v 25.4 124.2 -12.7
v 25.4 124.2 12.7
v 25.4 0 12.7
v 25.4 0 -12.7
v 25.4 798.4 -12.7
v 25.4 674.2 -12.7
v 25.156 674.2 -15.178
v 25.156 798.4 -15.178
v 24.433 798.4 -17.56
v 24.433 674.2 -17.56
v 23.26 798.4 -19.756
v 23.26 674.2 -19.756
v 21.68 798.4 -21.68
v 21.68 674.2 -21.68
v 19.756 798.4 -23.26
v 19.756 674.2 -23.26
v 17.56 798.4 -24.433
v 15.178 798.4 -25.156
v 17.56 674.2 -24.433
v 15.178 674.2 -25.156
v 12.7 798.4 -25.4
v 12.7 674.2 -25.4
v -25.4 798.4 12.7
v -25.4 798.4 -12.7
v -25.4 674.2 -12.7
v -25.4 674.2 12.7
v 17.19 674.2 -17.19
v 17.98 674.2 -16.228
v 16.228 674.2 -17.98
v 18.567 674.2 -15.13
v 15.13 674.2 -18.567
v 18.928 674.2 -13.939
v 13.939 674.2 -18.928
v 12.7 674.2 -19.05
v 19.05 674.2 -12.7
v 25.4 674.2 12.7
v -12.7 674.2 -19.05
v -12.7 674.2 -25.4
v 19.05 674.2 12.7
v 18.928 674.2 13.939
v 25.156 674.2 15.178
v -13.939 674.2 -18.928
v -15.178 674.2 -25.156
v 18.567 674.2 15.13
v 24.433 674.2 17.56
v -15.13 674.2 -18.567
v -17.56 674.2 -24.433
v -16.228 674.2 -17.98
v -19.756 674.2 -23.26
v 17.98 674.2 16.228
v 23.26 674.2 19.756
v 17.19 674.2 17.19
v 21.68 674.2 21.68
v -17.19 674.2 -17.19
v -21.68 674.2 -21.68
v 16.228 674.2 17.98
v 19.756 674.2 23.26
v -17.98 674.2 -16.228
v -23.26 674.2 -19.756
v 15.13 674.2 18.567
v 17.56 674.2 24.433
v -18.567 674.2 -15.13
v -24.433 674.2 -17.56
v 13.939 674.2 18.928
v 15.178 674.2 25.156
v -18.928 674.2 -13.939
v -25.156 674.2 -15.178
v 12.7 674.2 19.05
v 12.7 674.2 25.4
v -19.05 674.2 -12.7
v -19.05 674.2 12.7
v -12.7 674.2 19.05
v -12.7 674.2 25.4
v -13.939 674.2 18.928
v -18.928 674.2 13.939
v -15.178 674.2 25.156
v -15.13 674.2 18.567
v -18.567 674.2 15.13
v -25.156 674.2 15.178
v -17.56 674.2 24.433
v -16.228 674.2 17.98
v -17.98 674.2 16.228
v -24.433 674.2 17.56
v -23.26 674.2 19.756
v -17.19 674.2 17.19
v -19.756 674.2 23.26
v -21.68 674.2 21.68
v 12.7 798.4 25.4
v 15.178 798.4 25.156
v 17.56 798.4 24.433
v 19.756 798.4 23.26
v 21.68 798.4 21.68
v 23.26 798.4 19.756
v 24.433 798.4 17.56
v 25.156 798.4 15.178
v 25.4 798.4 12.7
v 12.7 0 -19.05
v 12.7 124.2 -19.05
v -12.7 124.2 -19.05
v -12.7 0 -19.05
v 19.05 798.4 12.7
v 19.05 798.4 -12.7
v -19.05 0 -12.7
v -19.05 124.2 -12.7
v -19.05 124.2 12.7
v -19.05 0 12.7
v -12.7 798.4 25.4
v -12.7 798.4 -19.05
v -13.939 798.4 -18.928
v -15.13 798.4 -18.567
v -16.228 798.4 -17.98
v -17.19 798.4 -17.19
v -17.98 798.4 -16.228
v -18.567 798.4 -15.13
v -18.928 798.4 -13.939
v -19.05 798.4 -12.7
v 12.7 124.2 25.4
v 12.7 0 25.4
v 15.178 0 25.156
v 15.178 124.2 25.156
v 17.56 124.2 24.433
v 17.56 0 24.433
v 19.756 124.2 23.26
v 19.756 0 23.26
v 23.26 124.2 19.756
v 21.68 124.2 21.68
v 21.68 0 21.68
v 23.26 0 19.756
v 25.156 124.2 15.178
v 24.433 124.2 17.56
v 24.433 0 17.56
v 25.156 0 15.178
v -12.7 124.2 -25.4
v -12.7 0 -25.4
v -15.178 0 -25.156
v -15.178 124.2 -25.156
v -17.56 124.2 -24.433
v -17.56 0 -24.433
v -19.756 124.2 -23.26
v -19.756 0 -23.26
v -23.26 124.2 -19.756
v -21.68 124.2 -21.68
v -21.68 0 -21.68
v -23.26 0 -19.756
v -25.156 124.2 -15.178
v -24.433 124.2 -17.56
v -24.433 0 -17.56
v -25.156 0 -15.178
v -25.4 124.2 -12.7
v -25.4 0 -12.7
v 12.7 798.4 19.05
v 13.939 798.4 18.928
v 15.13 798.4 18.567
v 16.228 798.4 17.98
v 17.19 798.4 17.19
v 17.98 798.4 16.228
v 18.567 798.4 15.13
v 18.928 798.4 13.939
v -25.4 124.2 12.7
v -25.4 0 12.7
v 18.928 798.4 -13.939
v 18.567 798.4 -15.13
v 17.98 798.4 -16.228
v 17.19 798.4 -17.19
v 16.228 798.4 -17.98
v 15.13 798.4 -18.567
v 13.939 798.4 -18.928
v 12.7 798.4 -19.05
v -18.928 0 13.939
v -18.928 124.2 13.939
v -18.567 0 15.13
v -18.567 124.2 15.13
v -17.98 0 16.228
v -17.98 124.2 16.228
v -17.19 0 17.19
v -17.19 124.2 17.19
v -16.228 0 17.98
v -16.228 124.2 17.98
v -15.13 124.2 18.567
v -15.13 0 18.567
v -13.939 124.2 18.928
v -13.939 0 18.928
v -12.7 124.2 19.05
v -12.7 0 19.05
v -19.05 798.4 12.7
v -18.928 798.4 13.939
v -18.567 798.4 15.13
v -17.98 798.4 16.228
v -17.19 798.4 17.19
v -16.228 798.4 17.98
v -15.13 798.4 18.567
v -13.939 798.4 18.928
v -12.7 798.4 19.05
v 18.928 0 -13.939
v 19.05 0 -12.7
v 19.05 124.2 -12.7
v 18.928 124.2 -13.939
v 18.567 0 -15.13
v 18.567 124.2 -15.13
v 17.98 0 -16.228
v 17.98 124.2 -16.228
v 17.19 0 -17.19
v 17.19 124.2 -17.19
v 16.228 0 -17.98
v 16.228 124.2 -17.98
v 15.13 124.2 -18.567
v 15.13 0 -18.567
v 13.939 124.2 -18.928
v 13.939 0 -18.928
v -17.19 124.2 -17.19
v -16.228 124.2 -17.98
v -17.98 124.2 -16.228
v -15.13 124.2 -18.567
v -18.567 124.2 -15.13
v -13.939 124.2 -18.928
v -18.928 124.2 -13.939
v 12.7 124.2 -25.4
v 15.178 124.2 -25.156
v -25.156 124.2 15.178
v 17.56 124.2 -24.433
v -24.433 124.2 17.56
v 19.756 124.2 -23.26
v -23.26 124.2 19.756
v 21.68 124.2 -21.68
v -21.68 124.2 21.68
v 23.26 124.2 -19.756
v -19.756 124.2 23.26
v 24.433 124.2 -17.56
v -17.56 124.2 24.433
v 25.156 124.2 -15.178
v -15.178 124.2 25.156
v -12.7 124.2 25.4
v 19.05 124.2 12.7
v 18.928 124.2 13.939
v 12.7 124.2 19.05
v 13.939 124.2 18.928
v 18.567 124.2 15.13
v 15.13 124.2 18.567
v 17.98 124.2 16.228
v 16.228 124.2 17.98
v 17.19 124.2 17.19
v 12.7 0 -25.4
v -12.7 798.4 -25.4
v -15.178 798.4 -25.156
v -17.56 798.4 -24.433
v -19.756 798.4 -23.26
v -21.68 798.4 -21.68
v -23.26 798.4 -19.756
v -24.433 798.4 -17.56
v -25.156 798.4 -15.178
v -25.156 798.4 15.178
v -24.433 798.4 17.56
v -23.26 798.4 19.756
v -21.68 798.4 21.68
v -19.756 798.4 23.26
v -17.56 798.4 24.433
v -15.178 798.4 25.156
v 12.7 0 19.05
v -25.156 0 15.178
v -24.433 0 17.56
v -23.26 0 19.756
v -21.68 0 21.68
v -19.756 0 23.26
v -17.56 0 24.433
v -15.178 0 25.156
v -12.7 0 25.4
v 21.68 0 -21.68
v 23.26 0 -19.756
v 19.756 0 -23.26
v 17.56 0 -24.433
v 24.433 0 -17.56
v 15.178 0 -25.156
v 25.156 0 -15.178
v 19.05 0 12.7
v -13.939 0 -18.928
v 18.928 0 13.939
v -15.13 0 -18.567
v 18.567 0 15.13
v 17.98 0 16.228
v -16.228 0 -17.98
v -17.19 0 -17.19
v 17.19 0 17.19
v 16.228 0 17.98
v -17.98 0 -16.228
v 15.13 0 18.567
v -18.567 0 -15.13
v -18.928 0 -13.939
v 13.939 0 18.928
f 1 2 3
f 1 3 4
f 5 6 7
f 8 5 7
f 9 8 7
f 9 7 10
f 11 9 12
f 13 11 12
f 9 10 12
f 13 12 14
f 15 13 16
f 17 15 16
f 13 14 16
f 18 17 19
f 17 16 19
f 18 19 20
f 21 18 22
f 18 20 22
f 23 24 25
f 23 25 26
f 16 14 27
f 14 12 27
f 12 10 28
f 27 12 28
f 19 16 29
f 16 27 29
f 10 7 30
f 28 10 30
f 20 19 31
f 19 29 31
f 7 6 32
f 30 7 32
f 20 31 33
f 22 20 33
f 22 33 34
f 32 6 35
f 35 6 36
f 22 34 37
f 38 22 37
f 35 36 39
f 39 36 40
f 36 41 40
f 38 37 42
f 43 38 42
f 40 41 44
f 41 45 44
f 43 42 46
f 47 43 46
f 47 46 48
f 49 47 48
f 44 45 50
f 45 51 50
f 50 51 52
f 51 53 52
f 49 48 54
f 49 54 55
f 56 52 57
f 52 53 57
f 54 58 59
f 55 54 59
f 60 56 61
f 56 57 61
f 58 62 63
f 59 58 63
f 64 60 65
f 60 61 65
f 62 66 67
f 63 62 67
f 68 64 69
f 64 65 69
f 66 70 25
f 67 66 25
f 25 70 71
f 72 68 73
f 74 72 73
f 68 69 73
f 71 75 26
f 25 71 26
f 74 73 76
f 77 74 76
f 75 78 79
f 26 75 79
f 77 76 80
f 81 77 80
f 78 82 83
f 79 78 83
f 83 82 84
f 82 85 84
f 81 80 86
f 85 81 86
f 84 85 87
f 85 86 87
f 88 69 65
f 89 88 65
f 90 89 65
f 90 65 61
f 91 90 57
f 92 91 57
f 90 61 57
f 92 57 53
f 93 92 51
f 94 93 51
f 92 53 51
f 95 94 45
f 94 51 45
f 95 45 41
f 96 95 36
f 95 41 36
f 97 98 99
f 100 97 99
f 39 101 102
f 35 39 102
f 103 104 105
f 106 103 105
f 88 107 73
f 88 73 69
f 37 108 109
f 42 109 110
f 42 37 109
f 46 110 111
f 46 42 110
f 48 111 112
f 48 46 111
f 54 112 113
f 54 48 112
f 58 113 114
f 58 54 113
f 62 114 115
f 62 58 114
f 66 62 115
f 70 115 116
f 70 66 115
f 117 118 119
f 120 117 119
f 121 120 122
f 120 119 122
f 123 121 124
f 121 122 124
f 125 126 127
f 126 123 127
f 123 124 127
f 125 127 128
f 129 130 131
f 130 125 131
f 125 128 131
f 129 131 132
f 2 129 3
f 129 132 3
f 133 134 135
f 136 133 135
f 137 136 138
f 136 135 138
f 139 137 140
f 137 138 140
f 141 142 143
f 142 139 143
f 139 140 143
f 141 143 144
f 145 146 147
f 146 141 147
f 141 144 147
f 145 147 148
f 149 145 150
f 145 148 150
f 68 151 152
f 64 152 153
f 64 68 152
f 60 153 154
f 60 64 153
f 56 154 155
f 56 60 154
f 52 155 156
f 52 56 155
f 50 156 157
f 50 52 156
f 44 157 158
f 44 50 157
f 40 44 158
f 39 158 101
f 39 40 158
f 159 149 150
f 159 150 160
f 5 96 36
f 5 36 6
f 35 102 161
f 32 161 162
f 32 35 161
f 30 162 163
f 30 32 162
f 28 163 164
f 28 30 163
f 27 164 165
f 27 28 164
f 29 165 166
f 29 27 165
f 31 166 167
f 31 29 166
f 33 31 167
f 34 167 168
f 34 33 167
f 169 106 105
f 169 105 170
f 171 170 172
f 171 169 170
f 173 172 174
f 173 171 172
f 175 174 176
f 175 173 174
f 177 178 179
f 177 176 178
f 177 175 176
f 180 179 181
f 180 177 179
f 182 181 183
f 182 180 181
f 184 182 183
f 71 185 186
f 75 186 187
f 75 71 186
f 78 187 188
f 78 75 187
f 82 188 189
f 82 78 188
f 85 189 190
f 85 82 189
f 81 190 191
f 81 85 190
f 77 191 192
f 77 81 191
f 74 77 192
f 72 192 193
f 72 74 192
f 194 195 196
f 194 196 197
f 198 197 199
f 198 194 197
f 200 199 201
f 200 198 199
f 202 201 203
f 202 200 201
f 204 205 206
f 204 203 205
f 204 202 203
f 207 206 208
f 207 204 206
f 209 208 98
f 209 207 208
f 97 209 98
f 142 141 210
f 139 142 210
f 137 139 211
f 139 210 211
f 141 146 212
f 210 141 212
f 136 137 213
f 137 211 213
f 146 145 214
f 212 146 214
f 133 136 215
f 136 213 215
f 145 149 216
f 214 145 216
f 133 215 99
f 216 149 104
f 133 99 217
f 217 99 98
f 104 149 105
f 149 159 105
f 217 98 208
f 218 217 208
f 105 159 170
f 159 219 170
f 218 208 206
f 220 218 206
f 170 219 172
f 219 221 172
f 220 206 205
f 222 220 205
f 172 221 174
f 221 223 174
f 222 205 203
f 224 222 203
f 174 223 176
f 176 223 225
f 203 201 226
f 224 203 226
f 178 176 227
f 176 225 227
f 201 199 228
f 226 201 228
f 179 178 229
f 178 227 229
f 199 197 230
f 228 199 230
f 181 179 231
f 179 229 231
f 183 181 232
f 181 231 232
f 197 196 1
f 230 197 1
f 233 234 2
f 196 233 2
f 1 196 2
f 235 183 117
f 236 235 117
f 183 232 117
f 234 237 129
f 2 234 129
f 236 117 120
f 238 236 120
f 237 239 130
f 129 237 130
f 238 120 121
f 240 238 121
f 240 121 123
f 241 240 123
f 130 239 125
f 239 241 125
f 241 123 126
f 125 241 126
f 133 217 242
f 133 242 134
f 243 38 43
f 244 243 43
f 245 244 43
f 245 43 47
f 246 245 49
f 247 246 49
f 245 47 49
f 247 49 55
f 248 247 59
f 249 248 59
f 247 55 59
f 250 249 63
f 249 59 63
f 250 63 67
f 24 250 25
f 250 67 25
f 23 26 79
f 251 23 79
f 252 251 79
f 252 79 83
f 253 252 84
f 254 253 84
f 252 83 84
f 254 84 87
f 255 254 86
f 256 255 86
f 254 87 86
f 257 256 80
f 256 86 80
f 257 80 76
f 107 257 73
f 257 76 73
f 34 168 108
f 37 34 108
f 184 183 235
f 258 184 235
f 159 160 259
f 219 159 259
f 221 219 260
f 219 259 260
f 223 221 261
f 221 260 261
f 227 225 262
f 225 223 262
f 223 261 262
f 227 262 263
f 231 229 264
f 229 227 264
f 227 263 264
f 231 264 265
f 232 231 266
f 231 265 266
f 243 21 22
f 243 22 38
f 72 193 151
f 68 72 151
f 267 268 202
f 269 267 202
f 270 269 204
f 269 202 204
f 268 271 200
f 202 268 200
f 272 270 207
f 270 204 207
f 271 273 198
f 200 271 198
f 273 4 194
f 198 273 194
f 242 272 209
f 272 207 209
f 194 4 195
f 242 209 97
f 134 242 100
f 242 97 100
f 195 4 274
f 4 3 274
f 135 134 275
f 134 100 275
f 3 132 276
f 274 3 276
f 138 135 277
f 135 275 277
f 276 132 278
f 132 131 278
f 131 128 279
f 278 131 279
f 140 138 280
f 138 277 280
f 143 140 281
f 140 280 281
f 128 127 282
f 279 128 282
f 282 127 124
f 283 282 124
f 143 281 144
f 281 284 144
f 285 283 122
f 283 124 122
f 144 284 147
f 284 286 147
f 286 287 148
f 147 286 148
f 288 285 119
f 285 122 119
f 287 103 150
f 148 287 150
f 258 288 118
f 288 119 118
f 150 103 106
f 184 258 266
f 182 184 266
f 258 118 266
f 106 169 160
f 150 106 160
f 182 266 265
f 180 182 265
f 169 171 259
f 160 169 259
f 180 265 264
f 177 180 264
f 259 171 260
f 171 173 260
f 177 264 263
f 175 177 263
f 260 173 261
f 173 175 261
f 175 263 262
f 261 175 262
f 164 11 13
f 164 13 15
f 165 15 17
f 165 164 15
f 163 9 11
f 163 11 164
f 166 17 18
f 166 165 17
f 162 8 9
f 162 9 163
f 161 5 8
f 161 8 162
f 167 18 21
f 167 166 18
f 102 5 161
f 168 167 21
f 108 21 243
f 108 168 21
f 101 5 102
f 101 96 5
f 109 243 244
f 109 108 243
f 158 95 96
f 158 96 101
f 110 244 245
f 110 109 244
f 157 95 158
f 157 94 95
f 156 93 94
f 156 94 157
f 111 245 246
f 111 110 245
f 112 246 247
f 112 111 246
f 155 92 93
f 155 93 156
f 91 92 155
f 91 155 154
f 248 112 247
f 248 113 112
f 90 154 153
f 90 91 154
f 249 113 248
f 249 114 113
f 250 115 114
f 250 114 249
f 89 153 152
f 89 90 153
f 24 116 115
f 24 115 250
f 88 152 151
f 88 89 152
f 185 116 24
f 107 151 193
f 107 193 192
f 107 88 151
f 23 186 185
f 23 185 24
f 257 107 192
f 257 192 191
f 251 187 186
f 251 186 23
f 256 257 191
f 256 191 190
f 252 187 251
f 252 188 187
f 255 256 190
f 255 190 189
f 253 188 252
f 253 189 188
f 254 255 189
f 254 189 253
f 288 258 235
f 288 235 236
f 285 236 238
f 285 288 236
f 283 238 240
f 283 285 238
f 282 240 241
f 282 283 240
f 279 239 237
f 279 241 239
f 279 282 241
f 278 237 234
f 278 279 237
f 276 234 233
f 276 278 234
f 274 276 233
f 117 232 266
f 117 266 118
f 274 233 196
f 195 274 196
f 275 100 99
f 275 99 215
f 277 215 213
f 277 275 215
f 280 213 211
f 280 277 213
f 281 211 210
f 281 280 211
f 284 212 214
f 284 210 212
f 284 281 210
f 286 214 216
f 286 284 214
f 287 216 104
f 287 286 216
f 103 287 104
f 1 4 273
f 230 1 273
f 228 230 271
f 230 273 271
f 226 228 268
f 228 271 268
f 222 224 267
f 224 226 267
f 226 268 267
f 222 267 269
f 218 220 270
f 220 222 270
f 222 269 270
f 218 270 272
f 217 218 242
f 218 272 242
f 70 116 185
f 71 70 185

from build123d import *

# Parameters (mm, degrees)
TUBO_CUADRADO_2_X_2_X_0_25_1_DEPTH = 798.4
CROQUIS2_W                         = 12.7
CROQUIS2_H                         = 550
CORTAR_EXTRUIR1_DEPTH              = 101


with BuildPart() as part:
    # Sketch1 → Tubo cuadrado 2 X 2 X 0.25(1) (new body)
    with BuildSketch(Plane(origin=(0, 0, 0), x_dir=(-1, 0, 0), z_dir=(0, 1, 0))):
        with BuildLine():
            Line((-12.7, -25.4), (12.7, -25.4))
            ThreePointArc((12.7, -25.4), (21.680256121, -21.680256121), (25.4, -12.7))
            Line((25.4, -12.7), (25.4, 12.7))
            ThreePointArc((25.4, 12.7), (21.680256121, 21.680256121), (12.7, 25.4))
            Line((12.7, 25.4), (-12.7, 25.4))
            ThreePointArc((-12.7, 25.4), (-21.680256121, 21.680256121), (-25.4, 12.7))
            Line((-25.4, 12.7), (-25.4, -12.7))
            ThreePointArc((-25.4, -12.7), (-21.680256121, -21.680256121), (-12.7, -25.4))
        make_face()
        with BuildLine():
            Line((-12.7, -19.05), (12.7, -19.05))
            ThreePointArc((12.7, -19.05), (17.190128061, -17.190128061), (19.05, -12.7))
            Line((19.05, -12.7), (19.05, 12.7))
            ThreePointArc((19.05, 12.7), (17.190128061, 17.190128061), (12.7, 19.05))
            Line((12.7, 19.05), (-12.7, 19.05))
            ThreePointArc((-12.7, 19.05), (-17.190128061, 17.190128061), (-19.05, 12.7))
            Line((-19.05, 12.7), (-19.05, -12.7))
            ThreePointArc((-19.05, -12.7), (-17.190128061, -17.190128061), (-12.7, -19.05))
        make_face(mode=Mode.SUBTRACT)
    extrude(amount=TUBO_CUADRADO_2_X_2_X_0_25_1_DEPTH)

    # Croquis2 → Cortar-Extruir1 (cut)
    with BuildSketch(Plane.XY.offset(25.4)):
        with Locations((-19.05, 399.2)):
            Rectangle(CROQUIS2_W, CROQUIS2_H)
        Polygon((-12.7, 124.2), (0, 124.2), (12.7, 124.2), (12.7, 674.2), (-12.7, 674.2), align=None)
        with Locations((19.05, 399.2)):
            Rectangle(CROQUIS2_W, CROQUIS2_H)
    extrude(amount=-CORTAR_EXTRUIR1_DEPTH, mode=Mode.SUBTRACT)


with BuildPart() as cortar_extruir1_piece_1:
    # of the separate pieces the step leaves, piece 1, a body of its own (cortar_extruir1_pieces)
    add(part.part.solids().sort_by_distance((25.4, 0, 12.7))[0])


with BuildPart() as cortar_extruir1_piece_2:
    # of the separate pieces the step leaves, piece 2, a body of its own (cortar_extruir1_pieces)
    add(part.part.solids().sort_by_distance((25.4, 674.2, 12.7))[0])


solid = Compound([cortar_extruir1_piece_1.part, cortar_extruir1_piece_2.part])
